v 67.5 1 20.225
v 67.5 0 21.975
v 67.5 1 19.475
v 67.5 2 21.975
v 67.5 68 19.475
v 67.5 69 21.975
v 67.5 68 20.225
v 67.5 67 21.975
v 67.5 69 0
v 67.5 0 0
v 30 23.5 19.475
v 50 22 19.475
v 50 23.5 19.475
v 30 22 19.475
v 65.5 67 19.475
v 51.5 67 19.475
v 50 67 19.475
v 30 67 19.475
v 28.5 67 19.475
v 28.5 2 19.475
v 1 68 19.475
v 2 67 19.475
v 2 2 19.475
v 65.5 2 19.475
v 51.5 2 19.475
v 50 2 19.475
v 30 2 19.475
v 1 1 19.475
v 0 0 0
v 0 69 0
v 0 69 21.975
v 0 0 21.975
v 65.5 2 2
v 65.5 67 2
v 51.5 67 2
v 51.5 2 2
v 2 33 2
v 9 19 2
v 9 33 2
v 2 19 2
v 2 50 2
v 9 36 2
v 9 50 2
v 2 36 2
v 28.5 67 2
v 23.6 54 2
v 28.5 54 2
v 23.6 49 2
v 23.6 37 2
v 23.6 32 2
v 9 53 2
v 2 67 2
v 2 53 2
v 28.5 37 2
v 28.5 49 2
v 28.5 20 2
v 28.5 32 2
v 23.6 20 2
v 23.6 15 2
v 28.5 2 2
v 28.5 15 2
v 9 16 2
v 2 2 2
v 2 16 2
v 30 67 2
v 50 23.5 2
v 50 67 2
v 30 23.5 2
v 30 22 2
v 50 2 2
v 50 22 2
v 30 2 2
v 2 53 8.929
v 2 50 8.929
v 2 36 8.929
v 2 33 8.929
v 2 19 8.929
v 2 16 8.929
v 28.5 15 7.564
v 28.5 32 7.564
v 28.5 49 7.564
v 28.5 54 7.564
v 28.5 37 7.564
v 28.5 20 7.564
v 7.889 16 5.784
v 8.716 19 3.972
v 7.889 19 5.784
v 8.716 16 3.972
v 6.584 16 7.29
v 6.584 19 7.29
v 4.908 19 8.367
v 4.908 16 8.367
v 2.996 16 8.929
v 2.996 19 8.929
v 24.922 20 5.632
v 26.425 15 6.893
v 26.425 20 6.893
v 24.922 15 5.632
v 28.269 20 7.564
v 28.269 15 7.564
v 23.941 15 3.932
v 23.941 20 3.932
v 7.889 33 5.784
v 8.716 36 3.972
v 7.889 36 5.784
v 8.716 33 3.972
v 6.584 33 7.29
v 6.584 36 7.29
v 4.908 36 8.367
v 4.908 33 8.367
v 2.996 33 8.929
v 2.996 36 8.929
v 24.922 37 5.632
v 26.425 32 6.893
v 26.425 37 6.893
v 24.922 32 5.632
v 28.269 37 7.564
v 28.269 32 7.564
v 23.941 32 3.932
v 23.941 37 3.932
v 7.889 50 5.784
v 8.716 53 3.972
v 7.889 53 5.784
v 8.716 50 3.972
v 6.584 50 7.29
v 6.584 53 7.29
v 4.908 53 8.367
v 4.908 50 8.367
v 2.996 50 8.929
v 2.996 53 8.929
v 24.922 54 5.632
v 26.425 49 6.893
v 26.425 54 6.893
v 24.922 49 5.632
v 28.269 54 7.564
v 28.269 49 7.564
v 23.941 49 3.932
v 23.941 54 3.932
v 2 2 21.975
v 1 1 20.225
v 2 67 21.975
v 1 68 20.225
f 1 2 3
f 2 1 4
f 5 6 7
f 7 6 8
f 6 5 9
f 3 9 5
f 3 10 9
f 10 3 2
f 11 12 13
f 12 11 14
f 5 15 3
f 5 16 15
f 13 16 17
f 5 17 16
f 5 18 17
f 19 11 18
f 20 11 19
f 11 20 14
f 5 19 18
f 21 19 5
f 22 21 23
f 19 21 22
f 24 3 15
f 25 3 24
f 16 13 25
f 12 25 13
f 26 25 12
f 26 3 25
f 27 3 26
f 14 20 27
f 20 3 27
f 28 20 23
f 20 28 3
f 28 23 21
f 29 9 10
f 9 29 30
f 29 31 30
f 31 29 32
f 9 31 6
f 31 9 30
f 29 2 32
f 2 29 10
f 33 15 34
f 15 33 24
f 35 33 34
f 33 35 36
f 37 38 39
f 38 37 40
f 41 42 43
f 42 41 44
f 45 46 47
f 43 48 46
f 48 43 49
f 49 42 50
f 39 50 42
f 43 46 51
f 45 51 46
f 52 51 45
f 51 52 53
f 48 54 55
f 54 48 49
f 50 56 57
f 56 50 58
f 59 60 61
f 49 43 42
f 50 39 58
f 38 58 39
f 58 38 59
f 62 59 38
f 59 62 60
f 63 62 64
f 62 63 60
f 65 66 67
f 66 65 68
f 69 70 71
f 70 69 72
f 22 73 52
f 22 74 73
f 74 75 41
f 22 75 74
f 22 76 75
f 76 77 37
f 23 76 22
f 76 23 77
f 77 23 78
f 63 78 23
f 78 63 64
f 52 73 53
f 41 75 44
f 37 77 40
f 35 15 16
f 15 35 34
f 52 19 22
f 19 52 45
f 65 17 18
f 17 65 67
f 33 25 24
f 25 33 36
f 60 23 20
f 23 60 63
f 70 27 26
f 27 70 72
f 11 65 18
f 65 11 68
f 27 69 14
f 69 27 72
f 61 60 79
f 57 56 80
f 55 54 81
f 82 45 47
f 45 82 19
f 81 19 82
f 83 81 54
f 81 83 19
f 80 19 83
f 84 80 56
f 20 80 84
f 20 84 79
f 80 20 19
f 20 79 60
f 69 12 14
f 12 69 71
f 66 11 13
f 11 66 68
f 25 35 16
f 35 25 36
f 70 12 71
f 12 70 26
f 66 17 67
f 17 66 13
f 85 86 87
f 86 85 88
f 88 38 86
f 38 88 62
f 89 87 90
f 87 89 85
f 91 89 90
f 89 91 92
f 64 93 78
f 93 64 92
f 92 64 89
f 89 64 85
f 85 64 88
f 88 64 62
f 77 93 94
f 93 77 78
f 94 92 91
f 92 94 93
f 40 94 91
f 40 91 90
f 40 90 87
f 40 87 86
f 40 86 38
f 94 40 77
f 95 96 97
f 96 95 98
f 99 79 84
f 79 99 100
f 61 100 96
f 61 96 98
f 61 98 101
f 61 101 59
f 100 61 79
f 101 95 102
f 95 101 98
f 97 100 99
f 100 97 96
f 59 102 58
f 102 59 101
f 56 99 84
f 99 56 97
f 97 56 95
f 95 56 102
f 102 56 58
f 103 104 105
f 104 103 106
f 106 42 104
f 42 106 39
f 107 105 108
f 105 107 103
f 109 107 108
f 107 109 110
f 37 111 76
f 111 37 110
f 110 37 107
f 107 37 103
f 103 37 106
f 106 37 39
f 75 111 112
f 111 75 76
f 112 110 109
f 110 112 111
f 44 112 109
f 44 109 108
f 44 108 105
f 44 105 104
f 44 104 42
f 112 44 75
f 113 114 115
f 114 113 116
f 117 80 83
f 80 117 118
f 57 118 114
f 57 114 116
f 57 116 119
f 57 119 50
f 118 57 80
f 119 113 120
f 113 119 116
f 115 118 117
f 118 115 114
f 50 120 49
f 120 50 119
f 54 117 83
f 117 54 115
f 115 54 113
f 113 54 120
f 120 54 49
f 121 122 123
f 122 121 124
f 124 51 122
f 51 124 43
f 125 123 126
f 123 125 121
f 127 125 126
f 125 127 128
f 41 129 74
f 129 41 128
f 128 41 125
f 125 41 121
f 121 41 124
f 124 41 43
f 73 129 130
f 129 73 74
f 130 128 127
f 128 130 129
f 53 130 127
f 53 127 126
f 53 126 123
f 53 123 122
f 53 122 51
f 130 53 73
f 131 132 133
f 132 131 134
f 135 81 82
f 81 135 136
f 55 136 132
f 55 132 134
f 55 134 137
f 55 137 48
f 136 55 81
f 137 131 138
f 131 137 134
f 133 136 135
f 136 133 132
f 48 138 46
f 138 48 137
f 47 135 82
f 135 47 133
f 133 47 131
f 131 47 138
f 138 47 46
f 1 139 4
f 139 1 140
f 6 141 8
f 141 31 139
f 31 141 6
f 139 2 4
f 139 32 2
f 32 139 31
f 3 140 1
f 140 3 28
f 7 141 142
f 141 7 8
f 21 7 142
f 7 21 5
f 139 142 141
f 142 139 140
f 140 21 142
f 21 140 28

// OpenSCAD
// file: divided_box.scad
module dividers(div, size, thickness) {
  // div: an array of divider positions (centers), must be increasing.
  //      Nested arrays will alter direction from +x to +y, or +y to +x.
  // size: a 3 component vector
  // thickness: thickness of each wall

  for (i = [0:len(div)-1]) {
    if (len(div[i])) {
      // Handle nested dividers by flipping direction.
      assign (start = i > 0 ? div[i-1] : 0,
              end = i < len(div)-1 ? div[i+1] : size[0]) {
        translate([start, 0, 0])
        multmatrix([[0, 1, 0, 0],
                    [1, 0, 0, 0],
                    [0, 0, 1, 0],
                    [0, 0, 0, 1]])
        dividers(div[i], [size[1], end - start, size[2]], thickness);
      }
    } else {
      translate([div[i]-thickness/2, 0, 0]) cube([thickness, size[1], size[2]]);
    }
  }
}

module divided_box(div, size, to=2, tb=1.5, ti=1) {
  // div:  see dividers()
  // size: outside dimensions of the box
  // to:   thickness of outsize wall
  // tb:   thickness of bottom
  // ti:   thickness of inside wall
  difference() {
    cube(size);
    translate([to, to, tb]) cube(size - [2*to, 2*to, 0]);
  }
  dividers(div, size, ti);
}

divided_box([[50], 25, 50, [33, 66], 75, [50]], [100, 100, 10]);
// main file
use <divided_box.scad>;

big = 100;
small = 0.01;

// Individual dude measurements
dude_head_d = 9.3;
dude_neck_d = 6.0;
dude_neck_h = 13.9;
dude_foot_d = 12.0;
dude_height = 24.5;

// Collective dude array
dude_colors = ["cyan", "pink", "orange", "lime", "green", "olive", "white"];
dude_stride = 17;
dude_pad = 1.0;
dude_line = 17.475 - dude_pad - dude_foot_d;

house_height = 14;
circle_d = 20;

// Outside/bottom/inside thicknesses
box_to = 2;
box_tb = 2;
box_ti = 1.5;

// Box divisions
div1 = box_to + box_ti/2 + dude_height + 2*dude_pad;
div2 = box_to + box_ti/2 + circle_d;
div3 = div1 + box_ti + circle_d;

// Overall box dimensions
box_dim = [div3 + house_height + box_ti/2 + box_to,
           dude_foot_d + 2*dude_pad + floor(len(dude_colors)/2)*dude_stride + 2*box_to,
           19.475];
echo("Box dimensions: ", box_dim);

// Slide rail
rail_profile = [[0, 0], [0, 2.5], [2, 2.5], [1, 0.75], [1, 0]];

// Draw a single dude, for visualization only
module dude() {
  hull() {
    translate([0, 0, dude_height - dude_head_d/2])
    sphere(d=dude_head_d);

    translate([0, 0, dude_neck_h])
    linear_extrude(height=small)
    circle(d=dude_neck_d);
  }

  cylinder(h=dude_neck_h, d1=dude_foot_d, d2=dude_neck_d);
}

// Draw a row of dudes, for visualization only
module dude_array(colors) {
  for (i = [0:len(colors)-1]) {
    translate((dude_foot_d/2 + dude_pad) * [1, 1, 0])
    translate([dude_stride * i, 0, 0])
    color(colors[i])
    dude();
  }
}

// Draw all the dudes, for visualization only
module dude_stack(colors) {
  dude_array([for (i = [0:2:len(colors)-1]) colors[i]]);
  translate([dude_stride/2, dude_line, dude_height])
  scale([1, 1, -1])
  dude_array([for (i = [1:2:len(colors)-1]) colors[i]]);
}

// Build little dividers between the dudes to keep them packing correctly
module dude_sep() {
  n = floor(len(dude_colors)/2);

  intersection() {
    translate([0, box_to + dude_pad + dude_foot_d/2 + dude_stride/2, 0])
    for (i = [0:n-1]) {
      translate([0, i * dude_stride, box_tb]) {
        translate([box_to, 0, 0])
        rotate([90, 0, 0])
        cylinder(r = dude_foot_d/2 + dude_pad, h = 3, center=true);

        translate([div1, 0, 0])
        rotate([90, 0, 0])
        cylinder(r = dude_head_d/2 + dude_pad, h = 5, center=true);
      }
    }
    cube([div1, big, big]);
  }
}

// A single rail
module rail(height) {
  rotate([0, 90, 0])
  linear_extrude(height=height)
  rotate([0, 0, 90])
  polygon(rail_profile);
}

// Rails along 3 top edges
module rails() {
  translate([0, 0, box_dim[2]])
  rail(box_dim[0]);

  translate([0, box_dim[1], box_dim[2]])
  scale([1, -1, 1])
  rail(box_dim[0]);

  translate([0, 0, box_dim[2]])
  rotate([0, 0, 90])
  scale([1, -1, 1])
  rail(box_dim[1]);
}

// Sliding lid with a little bulge for a handle
module box_top(handle_r = 5, handle_offset = 5) {
  difference() {
    translate([small, small, box_dim[2] + 0.25])
    cube([box_dim[0]-2*small, box_dim[1]-2*small, 2]);

    rails();
  }

  intersection() {
    translate([0, 0, box_dim[2]+1.5])
    cube([big, big, big]);

    translate([box_dim[0] - handle_offset, 0, box_dim[2] - 1.5])
    hull() {
      translate([0, 10, 0])
      sphere(r=handle_r);

      translate([0, box_dim[1]-10, 0])
      sphere(r=handle_r);
    }
  }
}

module dude_box(dudes=1, box=1, top=0) {
  if (dudes) {
    // For visualization only
    translate([box_to + dude_pad, box_to, box_tb])
    rotate([90, 0, 90])
    dude_stack(dude_colors);
  }

  if (box) {
    divided_box([div1, [div2], div3], box_dim, box_to, box_tb, box_ti);
    dude_sep();
    rails();
  }

  if (top) {
    box_top();
  }
}

dude_box(top=0,dudes=0);
